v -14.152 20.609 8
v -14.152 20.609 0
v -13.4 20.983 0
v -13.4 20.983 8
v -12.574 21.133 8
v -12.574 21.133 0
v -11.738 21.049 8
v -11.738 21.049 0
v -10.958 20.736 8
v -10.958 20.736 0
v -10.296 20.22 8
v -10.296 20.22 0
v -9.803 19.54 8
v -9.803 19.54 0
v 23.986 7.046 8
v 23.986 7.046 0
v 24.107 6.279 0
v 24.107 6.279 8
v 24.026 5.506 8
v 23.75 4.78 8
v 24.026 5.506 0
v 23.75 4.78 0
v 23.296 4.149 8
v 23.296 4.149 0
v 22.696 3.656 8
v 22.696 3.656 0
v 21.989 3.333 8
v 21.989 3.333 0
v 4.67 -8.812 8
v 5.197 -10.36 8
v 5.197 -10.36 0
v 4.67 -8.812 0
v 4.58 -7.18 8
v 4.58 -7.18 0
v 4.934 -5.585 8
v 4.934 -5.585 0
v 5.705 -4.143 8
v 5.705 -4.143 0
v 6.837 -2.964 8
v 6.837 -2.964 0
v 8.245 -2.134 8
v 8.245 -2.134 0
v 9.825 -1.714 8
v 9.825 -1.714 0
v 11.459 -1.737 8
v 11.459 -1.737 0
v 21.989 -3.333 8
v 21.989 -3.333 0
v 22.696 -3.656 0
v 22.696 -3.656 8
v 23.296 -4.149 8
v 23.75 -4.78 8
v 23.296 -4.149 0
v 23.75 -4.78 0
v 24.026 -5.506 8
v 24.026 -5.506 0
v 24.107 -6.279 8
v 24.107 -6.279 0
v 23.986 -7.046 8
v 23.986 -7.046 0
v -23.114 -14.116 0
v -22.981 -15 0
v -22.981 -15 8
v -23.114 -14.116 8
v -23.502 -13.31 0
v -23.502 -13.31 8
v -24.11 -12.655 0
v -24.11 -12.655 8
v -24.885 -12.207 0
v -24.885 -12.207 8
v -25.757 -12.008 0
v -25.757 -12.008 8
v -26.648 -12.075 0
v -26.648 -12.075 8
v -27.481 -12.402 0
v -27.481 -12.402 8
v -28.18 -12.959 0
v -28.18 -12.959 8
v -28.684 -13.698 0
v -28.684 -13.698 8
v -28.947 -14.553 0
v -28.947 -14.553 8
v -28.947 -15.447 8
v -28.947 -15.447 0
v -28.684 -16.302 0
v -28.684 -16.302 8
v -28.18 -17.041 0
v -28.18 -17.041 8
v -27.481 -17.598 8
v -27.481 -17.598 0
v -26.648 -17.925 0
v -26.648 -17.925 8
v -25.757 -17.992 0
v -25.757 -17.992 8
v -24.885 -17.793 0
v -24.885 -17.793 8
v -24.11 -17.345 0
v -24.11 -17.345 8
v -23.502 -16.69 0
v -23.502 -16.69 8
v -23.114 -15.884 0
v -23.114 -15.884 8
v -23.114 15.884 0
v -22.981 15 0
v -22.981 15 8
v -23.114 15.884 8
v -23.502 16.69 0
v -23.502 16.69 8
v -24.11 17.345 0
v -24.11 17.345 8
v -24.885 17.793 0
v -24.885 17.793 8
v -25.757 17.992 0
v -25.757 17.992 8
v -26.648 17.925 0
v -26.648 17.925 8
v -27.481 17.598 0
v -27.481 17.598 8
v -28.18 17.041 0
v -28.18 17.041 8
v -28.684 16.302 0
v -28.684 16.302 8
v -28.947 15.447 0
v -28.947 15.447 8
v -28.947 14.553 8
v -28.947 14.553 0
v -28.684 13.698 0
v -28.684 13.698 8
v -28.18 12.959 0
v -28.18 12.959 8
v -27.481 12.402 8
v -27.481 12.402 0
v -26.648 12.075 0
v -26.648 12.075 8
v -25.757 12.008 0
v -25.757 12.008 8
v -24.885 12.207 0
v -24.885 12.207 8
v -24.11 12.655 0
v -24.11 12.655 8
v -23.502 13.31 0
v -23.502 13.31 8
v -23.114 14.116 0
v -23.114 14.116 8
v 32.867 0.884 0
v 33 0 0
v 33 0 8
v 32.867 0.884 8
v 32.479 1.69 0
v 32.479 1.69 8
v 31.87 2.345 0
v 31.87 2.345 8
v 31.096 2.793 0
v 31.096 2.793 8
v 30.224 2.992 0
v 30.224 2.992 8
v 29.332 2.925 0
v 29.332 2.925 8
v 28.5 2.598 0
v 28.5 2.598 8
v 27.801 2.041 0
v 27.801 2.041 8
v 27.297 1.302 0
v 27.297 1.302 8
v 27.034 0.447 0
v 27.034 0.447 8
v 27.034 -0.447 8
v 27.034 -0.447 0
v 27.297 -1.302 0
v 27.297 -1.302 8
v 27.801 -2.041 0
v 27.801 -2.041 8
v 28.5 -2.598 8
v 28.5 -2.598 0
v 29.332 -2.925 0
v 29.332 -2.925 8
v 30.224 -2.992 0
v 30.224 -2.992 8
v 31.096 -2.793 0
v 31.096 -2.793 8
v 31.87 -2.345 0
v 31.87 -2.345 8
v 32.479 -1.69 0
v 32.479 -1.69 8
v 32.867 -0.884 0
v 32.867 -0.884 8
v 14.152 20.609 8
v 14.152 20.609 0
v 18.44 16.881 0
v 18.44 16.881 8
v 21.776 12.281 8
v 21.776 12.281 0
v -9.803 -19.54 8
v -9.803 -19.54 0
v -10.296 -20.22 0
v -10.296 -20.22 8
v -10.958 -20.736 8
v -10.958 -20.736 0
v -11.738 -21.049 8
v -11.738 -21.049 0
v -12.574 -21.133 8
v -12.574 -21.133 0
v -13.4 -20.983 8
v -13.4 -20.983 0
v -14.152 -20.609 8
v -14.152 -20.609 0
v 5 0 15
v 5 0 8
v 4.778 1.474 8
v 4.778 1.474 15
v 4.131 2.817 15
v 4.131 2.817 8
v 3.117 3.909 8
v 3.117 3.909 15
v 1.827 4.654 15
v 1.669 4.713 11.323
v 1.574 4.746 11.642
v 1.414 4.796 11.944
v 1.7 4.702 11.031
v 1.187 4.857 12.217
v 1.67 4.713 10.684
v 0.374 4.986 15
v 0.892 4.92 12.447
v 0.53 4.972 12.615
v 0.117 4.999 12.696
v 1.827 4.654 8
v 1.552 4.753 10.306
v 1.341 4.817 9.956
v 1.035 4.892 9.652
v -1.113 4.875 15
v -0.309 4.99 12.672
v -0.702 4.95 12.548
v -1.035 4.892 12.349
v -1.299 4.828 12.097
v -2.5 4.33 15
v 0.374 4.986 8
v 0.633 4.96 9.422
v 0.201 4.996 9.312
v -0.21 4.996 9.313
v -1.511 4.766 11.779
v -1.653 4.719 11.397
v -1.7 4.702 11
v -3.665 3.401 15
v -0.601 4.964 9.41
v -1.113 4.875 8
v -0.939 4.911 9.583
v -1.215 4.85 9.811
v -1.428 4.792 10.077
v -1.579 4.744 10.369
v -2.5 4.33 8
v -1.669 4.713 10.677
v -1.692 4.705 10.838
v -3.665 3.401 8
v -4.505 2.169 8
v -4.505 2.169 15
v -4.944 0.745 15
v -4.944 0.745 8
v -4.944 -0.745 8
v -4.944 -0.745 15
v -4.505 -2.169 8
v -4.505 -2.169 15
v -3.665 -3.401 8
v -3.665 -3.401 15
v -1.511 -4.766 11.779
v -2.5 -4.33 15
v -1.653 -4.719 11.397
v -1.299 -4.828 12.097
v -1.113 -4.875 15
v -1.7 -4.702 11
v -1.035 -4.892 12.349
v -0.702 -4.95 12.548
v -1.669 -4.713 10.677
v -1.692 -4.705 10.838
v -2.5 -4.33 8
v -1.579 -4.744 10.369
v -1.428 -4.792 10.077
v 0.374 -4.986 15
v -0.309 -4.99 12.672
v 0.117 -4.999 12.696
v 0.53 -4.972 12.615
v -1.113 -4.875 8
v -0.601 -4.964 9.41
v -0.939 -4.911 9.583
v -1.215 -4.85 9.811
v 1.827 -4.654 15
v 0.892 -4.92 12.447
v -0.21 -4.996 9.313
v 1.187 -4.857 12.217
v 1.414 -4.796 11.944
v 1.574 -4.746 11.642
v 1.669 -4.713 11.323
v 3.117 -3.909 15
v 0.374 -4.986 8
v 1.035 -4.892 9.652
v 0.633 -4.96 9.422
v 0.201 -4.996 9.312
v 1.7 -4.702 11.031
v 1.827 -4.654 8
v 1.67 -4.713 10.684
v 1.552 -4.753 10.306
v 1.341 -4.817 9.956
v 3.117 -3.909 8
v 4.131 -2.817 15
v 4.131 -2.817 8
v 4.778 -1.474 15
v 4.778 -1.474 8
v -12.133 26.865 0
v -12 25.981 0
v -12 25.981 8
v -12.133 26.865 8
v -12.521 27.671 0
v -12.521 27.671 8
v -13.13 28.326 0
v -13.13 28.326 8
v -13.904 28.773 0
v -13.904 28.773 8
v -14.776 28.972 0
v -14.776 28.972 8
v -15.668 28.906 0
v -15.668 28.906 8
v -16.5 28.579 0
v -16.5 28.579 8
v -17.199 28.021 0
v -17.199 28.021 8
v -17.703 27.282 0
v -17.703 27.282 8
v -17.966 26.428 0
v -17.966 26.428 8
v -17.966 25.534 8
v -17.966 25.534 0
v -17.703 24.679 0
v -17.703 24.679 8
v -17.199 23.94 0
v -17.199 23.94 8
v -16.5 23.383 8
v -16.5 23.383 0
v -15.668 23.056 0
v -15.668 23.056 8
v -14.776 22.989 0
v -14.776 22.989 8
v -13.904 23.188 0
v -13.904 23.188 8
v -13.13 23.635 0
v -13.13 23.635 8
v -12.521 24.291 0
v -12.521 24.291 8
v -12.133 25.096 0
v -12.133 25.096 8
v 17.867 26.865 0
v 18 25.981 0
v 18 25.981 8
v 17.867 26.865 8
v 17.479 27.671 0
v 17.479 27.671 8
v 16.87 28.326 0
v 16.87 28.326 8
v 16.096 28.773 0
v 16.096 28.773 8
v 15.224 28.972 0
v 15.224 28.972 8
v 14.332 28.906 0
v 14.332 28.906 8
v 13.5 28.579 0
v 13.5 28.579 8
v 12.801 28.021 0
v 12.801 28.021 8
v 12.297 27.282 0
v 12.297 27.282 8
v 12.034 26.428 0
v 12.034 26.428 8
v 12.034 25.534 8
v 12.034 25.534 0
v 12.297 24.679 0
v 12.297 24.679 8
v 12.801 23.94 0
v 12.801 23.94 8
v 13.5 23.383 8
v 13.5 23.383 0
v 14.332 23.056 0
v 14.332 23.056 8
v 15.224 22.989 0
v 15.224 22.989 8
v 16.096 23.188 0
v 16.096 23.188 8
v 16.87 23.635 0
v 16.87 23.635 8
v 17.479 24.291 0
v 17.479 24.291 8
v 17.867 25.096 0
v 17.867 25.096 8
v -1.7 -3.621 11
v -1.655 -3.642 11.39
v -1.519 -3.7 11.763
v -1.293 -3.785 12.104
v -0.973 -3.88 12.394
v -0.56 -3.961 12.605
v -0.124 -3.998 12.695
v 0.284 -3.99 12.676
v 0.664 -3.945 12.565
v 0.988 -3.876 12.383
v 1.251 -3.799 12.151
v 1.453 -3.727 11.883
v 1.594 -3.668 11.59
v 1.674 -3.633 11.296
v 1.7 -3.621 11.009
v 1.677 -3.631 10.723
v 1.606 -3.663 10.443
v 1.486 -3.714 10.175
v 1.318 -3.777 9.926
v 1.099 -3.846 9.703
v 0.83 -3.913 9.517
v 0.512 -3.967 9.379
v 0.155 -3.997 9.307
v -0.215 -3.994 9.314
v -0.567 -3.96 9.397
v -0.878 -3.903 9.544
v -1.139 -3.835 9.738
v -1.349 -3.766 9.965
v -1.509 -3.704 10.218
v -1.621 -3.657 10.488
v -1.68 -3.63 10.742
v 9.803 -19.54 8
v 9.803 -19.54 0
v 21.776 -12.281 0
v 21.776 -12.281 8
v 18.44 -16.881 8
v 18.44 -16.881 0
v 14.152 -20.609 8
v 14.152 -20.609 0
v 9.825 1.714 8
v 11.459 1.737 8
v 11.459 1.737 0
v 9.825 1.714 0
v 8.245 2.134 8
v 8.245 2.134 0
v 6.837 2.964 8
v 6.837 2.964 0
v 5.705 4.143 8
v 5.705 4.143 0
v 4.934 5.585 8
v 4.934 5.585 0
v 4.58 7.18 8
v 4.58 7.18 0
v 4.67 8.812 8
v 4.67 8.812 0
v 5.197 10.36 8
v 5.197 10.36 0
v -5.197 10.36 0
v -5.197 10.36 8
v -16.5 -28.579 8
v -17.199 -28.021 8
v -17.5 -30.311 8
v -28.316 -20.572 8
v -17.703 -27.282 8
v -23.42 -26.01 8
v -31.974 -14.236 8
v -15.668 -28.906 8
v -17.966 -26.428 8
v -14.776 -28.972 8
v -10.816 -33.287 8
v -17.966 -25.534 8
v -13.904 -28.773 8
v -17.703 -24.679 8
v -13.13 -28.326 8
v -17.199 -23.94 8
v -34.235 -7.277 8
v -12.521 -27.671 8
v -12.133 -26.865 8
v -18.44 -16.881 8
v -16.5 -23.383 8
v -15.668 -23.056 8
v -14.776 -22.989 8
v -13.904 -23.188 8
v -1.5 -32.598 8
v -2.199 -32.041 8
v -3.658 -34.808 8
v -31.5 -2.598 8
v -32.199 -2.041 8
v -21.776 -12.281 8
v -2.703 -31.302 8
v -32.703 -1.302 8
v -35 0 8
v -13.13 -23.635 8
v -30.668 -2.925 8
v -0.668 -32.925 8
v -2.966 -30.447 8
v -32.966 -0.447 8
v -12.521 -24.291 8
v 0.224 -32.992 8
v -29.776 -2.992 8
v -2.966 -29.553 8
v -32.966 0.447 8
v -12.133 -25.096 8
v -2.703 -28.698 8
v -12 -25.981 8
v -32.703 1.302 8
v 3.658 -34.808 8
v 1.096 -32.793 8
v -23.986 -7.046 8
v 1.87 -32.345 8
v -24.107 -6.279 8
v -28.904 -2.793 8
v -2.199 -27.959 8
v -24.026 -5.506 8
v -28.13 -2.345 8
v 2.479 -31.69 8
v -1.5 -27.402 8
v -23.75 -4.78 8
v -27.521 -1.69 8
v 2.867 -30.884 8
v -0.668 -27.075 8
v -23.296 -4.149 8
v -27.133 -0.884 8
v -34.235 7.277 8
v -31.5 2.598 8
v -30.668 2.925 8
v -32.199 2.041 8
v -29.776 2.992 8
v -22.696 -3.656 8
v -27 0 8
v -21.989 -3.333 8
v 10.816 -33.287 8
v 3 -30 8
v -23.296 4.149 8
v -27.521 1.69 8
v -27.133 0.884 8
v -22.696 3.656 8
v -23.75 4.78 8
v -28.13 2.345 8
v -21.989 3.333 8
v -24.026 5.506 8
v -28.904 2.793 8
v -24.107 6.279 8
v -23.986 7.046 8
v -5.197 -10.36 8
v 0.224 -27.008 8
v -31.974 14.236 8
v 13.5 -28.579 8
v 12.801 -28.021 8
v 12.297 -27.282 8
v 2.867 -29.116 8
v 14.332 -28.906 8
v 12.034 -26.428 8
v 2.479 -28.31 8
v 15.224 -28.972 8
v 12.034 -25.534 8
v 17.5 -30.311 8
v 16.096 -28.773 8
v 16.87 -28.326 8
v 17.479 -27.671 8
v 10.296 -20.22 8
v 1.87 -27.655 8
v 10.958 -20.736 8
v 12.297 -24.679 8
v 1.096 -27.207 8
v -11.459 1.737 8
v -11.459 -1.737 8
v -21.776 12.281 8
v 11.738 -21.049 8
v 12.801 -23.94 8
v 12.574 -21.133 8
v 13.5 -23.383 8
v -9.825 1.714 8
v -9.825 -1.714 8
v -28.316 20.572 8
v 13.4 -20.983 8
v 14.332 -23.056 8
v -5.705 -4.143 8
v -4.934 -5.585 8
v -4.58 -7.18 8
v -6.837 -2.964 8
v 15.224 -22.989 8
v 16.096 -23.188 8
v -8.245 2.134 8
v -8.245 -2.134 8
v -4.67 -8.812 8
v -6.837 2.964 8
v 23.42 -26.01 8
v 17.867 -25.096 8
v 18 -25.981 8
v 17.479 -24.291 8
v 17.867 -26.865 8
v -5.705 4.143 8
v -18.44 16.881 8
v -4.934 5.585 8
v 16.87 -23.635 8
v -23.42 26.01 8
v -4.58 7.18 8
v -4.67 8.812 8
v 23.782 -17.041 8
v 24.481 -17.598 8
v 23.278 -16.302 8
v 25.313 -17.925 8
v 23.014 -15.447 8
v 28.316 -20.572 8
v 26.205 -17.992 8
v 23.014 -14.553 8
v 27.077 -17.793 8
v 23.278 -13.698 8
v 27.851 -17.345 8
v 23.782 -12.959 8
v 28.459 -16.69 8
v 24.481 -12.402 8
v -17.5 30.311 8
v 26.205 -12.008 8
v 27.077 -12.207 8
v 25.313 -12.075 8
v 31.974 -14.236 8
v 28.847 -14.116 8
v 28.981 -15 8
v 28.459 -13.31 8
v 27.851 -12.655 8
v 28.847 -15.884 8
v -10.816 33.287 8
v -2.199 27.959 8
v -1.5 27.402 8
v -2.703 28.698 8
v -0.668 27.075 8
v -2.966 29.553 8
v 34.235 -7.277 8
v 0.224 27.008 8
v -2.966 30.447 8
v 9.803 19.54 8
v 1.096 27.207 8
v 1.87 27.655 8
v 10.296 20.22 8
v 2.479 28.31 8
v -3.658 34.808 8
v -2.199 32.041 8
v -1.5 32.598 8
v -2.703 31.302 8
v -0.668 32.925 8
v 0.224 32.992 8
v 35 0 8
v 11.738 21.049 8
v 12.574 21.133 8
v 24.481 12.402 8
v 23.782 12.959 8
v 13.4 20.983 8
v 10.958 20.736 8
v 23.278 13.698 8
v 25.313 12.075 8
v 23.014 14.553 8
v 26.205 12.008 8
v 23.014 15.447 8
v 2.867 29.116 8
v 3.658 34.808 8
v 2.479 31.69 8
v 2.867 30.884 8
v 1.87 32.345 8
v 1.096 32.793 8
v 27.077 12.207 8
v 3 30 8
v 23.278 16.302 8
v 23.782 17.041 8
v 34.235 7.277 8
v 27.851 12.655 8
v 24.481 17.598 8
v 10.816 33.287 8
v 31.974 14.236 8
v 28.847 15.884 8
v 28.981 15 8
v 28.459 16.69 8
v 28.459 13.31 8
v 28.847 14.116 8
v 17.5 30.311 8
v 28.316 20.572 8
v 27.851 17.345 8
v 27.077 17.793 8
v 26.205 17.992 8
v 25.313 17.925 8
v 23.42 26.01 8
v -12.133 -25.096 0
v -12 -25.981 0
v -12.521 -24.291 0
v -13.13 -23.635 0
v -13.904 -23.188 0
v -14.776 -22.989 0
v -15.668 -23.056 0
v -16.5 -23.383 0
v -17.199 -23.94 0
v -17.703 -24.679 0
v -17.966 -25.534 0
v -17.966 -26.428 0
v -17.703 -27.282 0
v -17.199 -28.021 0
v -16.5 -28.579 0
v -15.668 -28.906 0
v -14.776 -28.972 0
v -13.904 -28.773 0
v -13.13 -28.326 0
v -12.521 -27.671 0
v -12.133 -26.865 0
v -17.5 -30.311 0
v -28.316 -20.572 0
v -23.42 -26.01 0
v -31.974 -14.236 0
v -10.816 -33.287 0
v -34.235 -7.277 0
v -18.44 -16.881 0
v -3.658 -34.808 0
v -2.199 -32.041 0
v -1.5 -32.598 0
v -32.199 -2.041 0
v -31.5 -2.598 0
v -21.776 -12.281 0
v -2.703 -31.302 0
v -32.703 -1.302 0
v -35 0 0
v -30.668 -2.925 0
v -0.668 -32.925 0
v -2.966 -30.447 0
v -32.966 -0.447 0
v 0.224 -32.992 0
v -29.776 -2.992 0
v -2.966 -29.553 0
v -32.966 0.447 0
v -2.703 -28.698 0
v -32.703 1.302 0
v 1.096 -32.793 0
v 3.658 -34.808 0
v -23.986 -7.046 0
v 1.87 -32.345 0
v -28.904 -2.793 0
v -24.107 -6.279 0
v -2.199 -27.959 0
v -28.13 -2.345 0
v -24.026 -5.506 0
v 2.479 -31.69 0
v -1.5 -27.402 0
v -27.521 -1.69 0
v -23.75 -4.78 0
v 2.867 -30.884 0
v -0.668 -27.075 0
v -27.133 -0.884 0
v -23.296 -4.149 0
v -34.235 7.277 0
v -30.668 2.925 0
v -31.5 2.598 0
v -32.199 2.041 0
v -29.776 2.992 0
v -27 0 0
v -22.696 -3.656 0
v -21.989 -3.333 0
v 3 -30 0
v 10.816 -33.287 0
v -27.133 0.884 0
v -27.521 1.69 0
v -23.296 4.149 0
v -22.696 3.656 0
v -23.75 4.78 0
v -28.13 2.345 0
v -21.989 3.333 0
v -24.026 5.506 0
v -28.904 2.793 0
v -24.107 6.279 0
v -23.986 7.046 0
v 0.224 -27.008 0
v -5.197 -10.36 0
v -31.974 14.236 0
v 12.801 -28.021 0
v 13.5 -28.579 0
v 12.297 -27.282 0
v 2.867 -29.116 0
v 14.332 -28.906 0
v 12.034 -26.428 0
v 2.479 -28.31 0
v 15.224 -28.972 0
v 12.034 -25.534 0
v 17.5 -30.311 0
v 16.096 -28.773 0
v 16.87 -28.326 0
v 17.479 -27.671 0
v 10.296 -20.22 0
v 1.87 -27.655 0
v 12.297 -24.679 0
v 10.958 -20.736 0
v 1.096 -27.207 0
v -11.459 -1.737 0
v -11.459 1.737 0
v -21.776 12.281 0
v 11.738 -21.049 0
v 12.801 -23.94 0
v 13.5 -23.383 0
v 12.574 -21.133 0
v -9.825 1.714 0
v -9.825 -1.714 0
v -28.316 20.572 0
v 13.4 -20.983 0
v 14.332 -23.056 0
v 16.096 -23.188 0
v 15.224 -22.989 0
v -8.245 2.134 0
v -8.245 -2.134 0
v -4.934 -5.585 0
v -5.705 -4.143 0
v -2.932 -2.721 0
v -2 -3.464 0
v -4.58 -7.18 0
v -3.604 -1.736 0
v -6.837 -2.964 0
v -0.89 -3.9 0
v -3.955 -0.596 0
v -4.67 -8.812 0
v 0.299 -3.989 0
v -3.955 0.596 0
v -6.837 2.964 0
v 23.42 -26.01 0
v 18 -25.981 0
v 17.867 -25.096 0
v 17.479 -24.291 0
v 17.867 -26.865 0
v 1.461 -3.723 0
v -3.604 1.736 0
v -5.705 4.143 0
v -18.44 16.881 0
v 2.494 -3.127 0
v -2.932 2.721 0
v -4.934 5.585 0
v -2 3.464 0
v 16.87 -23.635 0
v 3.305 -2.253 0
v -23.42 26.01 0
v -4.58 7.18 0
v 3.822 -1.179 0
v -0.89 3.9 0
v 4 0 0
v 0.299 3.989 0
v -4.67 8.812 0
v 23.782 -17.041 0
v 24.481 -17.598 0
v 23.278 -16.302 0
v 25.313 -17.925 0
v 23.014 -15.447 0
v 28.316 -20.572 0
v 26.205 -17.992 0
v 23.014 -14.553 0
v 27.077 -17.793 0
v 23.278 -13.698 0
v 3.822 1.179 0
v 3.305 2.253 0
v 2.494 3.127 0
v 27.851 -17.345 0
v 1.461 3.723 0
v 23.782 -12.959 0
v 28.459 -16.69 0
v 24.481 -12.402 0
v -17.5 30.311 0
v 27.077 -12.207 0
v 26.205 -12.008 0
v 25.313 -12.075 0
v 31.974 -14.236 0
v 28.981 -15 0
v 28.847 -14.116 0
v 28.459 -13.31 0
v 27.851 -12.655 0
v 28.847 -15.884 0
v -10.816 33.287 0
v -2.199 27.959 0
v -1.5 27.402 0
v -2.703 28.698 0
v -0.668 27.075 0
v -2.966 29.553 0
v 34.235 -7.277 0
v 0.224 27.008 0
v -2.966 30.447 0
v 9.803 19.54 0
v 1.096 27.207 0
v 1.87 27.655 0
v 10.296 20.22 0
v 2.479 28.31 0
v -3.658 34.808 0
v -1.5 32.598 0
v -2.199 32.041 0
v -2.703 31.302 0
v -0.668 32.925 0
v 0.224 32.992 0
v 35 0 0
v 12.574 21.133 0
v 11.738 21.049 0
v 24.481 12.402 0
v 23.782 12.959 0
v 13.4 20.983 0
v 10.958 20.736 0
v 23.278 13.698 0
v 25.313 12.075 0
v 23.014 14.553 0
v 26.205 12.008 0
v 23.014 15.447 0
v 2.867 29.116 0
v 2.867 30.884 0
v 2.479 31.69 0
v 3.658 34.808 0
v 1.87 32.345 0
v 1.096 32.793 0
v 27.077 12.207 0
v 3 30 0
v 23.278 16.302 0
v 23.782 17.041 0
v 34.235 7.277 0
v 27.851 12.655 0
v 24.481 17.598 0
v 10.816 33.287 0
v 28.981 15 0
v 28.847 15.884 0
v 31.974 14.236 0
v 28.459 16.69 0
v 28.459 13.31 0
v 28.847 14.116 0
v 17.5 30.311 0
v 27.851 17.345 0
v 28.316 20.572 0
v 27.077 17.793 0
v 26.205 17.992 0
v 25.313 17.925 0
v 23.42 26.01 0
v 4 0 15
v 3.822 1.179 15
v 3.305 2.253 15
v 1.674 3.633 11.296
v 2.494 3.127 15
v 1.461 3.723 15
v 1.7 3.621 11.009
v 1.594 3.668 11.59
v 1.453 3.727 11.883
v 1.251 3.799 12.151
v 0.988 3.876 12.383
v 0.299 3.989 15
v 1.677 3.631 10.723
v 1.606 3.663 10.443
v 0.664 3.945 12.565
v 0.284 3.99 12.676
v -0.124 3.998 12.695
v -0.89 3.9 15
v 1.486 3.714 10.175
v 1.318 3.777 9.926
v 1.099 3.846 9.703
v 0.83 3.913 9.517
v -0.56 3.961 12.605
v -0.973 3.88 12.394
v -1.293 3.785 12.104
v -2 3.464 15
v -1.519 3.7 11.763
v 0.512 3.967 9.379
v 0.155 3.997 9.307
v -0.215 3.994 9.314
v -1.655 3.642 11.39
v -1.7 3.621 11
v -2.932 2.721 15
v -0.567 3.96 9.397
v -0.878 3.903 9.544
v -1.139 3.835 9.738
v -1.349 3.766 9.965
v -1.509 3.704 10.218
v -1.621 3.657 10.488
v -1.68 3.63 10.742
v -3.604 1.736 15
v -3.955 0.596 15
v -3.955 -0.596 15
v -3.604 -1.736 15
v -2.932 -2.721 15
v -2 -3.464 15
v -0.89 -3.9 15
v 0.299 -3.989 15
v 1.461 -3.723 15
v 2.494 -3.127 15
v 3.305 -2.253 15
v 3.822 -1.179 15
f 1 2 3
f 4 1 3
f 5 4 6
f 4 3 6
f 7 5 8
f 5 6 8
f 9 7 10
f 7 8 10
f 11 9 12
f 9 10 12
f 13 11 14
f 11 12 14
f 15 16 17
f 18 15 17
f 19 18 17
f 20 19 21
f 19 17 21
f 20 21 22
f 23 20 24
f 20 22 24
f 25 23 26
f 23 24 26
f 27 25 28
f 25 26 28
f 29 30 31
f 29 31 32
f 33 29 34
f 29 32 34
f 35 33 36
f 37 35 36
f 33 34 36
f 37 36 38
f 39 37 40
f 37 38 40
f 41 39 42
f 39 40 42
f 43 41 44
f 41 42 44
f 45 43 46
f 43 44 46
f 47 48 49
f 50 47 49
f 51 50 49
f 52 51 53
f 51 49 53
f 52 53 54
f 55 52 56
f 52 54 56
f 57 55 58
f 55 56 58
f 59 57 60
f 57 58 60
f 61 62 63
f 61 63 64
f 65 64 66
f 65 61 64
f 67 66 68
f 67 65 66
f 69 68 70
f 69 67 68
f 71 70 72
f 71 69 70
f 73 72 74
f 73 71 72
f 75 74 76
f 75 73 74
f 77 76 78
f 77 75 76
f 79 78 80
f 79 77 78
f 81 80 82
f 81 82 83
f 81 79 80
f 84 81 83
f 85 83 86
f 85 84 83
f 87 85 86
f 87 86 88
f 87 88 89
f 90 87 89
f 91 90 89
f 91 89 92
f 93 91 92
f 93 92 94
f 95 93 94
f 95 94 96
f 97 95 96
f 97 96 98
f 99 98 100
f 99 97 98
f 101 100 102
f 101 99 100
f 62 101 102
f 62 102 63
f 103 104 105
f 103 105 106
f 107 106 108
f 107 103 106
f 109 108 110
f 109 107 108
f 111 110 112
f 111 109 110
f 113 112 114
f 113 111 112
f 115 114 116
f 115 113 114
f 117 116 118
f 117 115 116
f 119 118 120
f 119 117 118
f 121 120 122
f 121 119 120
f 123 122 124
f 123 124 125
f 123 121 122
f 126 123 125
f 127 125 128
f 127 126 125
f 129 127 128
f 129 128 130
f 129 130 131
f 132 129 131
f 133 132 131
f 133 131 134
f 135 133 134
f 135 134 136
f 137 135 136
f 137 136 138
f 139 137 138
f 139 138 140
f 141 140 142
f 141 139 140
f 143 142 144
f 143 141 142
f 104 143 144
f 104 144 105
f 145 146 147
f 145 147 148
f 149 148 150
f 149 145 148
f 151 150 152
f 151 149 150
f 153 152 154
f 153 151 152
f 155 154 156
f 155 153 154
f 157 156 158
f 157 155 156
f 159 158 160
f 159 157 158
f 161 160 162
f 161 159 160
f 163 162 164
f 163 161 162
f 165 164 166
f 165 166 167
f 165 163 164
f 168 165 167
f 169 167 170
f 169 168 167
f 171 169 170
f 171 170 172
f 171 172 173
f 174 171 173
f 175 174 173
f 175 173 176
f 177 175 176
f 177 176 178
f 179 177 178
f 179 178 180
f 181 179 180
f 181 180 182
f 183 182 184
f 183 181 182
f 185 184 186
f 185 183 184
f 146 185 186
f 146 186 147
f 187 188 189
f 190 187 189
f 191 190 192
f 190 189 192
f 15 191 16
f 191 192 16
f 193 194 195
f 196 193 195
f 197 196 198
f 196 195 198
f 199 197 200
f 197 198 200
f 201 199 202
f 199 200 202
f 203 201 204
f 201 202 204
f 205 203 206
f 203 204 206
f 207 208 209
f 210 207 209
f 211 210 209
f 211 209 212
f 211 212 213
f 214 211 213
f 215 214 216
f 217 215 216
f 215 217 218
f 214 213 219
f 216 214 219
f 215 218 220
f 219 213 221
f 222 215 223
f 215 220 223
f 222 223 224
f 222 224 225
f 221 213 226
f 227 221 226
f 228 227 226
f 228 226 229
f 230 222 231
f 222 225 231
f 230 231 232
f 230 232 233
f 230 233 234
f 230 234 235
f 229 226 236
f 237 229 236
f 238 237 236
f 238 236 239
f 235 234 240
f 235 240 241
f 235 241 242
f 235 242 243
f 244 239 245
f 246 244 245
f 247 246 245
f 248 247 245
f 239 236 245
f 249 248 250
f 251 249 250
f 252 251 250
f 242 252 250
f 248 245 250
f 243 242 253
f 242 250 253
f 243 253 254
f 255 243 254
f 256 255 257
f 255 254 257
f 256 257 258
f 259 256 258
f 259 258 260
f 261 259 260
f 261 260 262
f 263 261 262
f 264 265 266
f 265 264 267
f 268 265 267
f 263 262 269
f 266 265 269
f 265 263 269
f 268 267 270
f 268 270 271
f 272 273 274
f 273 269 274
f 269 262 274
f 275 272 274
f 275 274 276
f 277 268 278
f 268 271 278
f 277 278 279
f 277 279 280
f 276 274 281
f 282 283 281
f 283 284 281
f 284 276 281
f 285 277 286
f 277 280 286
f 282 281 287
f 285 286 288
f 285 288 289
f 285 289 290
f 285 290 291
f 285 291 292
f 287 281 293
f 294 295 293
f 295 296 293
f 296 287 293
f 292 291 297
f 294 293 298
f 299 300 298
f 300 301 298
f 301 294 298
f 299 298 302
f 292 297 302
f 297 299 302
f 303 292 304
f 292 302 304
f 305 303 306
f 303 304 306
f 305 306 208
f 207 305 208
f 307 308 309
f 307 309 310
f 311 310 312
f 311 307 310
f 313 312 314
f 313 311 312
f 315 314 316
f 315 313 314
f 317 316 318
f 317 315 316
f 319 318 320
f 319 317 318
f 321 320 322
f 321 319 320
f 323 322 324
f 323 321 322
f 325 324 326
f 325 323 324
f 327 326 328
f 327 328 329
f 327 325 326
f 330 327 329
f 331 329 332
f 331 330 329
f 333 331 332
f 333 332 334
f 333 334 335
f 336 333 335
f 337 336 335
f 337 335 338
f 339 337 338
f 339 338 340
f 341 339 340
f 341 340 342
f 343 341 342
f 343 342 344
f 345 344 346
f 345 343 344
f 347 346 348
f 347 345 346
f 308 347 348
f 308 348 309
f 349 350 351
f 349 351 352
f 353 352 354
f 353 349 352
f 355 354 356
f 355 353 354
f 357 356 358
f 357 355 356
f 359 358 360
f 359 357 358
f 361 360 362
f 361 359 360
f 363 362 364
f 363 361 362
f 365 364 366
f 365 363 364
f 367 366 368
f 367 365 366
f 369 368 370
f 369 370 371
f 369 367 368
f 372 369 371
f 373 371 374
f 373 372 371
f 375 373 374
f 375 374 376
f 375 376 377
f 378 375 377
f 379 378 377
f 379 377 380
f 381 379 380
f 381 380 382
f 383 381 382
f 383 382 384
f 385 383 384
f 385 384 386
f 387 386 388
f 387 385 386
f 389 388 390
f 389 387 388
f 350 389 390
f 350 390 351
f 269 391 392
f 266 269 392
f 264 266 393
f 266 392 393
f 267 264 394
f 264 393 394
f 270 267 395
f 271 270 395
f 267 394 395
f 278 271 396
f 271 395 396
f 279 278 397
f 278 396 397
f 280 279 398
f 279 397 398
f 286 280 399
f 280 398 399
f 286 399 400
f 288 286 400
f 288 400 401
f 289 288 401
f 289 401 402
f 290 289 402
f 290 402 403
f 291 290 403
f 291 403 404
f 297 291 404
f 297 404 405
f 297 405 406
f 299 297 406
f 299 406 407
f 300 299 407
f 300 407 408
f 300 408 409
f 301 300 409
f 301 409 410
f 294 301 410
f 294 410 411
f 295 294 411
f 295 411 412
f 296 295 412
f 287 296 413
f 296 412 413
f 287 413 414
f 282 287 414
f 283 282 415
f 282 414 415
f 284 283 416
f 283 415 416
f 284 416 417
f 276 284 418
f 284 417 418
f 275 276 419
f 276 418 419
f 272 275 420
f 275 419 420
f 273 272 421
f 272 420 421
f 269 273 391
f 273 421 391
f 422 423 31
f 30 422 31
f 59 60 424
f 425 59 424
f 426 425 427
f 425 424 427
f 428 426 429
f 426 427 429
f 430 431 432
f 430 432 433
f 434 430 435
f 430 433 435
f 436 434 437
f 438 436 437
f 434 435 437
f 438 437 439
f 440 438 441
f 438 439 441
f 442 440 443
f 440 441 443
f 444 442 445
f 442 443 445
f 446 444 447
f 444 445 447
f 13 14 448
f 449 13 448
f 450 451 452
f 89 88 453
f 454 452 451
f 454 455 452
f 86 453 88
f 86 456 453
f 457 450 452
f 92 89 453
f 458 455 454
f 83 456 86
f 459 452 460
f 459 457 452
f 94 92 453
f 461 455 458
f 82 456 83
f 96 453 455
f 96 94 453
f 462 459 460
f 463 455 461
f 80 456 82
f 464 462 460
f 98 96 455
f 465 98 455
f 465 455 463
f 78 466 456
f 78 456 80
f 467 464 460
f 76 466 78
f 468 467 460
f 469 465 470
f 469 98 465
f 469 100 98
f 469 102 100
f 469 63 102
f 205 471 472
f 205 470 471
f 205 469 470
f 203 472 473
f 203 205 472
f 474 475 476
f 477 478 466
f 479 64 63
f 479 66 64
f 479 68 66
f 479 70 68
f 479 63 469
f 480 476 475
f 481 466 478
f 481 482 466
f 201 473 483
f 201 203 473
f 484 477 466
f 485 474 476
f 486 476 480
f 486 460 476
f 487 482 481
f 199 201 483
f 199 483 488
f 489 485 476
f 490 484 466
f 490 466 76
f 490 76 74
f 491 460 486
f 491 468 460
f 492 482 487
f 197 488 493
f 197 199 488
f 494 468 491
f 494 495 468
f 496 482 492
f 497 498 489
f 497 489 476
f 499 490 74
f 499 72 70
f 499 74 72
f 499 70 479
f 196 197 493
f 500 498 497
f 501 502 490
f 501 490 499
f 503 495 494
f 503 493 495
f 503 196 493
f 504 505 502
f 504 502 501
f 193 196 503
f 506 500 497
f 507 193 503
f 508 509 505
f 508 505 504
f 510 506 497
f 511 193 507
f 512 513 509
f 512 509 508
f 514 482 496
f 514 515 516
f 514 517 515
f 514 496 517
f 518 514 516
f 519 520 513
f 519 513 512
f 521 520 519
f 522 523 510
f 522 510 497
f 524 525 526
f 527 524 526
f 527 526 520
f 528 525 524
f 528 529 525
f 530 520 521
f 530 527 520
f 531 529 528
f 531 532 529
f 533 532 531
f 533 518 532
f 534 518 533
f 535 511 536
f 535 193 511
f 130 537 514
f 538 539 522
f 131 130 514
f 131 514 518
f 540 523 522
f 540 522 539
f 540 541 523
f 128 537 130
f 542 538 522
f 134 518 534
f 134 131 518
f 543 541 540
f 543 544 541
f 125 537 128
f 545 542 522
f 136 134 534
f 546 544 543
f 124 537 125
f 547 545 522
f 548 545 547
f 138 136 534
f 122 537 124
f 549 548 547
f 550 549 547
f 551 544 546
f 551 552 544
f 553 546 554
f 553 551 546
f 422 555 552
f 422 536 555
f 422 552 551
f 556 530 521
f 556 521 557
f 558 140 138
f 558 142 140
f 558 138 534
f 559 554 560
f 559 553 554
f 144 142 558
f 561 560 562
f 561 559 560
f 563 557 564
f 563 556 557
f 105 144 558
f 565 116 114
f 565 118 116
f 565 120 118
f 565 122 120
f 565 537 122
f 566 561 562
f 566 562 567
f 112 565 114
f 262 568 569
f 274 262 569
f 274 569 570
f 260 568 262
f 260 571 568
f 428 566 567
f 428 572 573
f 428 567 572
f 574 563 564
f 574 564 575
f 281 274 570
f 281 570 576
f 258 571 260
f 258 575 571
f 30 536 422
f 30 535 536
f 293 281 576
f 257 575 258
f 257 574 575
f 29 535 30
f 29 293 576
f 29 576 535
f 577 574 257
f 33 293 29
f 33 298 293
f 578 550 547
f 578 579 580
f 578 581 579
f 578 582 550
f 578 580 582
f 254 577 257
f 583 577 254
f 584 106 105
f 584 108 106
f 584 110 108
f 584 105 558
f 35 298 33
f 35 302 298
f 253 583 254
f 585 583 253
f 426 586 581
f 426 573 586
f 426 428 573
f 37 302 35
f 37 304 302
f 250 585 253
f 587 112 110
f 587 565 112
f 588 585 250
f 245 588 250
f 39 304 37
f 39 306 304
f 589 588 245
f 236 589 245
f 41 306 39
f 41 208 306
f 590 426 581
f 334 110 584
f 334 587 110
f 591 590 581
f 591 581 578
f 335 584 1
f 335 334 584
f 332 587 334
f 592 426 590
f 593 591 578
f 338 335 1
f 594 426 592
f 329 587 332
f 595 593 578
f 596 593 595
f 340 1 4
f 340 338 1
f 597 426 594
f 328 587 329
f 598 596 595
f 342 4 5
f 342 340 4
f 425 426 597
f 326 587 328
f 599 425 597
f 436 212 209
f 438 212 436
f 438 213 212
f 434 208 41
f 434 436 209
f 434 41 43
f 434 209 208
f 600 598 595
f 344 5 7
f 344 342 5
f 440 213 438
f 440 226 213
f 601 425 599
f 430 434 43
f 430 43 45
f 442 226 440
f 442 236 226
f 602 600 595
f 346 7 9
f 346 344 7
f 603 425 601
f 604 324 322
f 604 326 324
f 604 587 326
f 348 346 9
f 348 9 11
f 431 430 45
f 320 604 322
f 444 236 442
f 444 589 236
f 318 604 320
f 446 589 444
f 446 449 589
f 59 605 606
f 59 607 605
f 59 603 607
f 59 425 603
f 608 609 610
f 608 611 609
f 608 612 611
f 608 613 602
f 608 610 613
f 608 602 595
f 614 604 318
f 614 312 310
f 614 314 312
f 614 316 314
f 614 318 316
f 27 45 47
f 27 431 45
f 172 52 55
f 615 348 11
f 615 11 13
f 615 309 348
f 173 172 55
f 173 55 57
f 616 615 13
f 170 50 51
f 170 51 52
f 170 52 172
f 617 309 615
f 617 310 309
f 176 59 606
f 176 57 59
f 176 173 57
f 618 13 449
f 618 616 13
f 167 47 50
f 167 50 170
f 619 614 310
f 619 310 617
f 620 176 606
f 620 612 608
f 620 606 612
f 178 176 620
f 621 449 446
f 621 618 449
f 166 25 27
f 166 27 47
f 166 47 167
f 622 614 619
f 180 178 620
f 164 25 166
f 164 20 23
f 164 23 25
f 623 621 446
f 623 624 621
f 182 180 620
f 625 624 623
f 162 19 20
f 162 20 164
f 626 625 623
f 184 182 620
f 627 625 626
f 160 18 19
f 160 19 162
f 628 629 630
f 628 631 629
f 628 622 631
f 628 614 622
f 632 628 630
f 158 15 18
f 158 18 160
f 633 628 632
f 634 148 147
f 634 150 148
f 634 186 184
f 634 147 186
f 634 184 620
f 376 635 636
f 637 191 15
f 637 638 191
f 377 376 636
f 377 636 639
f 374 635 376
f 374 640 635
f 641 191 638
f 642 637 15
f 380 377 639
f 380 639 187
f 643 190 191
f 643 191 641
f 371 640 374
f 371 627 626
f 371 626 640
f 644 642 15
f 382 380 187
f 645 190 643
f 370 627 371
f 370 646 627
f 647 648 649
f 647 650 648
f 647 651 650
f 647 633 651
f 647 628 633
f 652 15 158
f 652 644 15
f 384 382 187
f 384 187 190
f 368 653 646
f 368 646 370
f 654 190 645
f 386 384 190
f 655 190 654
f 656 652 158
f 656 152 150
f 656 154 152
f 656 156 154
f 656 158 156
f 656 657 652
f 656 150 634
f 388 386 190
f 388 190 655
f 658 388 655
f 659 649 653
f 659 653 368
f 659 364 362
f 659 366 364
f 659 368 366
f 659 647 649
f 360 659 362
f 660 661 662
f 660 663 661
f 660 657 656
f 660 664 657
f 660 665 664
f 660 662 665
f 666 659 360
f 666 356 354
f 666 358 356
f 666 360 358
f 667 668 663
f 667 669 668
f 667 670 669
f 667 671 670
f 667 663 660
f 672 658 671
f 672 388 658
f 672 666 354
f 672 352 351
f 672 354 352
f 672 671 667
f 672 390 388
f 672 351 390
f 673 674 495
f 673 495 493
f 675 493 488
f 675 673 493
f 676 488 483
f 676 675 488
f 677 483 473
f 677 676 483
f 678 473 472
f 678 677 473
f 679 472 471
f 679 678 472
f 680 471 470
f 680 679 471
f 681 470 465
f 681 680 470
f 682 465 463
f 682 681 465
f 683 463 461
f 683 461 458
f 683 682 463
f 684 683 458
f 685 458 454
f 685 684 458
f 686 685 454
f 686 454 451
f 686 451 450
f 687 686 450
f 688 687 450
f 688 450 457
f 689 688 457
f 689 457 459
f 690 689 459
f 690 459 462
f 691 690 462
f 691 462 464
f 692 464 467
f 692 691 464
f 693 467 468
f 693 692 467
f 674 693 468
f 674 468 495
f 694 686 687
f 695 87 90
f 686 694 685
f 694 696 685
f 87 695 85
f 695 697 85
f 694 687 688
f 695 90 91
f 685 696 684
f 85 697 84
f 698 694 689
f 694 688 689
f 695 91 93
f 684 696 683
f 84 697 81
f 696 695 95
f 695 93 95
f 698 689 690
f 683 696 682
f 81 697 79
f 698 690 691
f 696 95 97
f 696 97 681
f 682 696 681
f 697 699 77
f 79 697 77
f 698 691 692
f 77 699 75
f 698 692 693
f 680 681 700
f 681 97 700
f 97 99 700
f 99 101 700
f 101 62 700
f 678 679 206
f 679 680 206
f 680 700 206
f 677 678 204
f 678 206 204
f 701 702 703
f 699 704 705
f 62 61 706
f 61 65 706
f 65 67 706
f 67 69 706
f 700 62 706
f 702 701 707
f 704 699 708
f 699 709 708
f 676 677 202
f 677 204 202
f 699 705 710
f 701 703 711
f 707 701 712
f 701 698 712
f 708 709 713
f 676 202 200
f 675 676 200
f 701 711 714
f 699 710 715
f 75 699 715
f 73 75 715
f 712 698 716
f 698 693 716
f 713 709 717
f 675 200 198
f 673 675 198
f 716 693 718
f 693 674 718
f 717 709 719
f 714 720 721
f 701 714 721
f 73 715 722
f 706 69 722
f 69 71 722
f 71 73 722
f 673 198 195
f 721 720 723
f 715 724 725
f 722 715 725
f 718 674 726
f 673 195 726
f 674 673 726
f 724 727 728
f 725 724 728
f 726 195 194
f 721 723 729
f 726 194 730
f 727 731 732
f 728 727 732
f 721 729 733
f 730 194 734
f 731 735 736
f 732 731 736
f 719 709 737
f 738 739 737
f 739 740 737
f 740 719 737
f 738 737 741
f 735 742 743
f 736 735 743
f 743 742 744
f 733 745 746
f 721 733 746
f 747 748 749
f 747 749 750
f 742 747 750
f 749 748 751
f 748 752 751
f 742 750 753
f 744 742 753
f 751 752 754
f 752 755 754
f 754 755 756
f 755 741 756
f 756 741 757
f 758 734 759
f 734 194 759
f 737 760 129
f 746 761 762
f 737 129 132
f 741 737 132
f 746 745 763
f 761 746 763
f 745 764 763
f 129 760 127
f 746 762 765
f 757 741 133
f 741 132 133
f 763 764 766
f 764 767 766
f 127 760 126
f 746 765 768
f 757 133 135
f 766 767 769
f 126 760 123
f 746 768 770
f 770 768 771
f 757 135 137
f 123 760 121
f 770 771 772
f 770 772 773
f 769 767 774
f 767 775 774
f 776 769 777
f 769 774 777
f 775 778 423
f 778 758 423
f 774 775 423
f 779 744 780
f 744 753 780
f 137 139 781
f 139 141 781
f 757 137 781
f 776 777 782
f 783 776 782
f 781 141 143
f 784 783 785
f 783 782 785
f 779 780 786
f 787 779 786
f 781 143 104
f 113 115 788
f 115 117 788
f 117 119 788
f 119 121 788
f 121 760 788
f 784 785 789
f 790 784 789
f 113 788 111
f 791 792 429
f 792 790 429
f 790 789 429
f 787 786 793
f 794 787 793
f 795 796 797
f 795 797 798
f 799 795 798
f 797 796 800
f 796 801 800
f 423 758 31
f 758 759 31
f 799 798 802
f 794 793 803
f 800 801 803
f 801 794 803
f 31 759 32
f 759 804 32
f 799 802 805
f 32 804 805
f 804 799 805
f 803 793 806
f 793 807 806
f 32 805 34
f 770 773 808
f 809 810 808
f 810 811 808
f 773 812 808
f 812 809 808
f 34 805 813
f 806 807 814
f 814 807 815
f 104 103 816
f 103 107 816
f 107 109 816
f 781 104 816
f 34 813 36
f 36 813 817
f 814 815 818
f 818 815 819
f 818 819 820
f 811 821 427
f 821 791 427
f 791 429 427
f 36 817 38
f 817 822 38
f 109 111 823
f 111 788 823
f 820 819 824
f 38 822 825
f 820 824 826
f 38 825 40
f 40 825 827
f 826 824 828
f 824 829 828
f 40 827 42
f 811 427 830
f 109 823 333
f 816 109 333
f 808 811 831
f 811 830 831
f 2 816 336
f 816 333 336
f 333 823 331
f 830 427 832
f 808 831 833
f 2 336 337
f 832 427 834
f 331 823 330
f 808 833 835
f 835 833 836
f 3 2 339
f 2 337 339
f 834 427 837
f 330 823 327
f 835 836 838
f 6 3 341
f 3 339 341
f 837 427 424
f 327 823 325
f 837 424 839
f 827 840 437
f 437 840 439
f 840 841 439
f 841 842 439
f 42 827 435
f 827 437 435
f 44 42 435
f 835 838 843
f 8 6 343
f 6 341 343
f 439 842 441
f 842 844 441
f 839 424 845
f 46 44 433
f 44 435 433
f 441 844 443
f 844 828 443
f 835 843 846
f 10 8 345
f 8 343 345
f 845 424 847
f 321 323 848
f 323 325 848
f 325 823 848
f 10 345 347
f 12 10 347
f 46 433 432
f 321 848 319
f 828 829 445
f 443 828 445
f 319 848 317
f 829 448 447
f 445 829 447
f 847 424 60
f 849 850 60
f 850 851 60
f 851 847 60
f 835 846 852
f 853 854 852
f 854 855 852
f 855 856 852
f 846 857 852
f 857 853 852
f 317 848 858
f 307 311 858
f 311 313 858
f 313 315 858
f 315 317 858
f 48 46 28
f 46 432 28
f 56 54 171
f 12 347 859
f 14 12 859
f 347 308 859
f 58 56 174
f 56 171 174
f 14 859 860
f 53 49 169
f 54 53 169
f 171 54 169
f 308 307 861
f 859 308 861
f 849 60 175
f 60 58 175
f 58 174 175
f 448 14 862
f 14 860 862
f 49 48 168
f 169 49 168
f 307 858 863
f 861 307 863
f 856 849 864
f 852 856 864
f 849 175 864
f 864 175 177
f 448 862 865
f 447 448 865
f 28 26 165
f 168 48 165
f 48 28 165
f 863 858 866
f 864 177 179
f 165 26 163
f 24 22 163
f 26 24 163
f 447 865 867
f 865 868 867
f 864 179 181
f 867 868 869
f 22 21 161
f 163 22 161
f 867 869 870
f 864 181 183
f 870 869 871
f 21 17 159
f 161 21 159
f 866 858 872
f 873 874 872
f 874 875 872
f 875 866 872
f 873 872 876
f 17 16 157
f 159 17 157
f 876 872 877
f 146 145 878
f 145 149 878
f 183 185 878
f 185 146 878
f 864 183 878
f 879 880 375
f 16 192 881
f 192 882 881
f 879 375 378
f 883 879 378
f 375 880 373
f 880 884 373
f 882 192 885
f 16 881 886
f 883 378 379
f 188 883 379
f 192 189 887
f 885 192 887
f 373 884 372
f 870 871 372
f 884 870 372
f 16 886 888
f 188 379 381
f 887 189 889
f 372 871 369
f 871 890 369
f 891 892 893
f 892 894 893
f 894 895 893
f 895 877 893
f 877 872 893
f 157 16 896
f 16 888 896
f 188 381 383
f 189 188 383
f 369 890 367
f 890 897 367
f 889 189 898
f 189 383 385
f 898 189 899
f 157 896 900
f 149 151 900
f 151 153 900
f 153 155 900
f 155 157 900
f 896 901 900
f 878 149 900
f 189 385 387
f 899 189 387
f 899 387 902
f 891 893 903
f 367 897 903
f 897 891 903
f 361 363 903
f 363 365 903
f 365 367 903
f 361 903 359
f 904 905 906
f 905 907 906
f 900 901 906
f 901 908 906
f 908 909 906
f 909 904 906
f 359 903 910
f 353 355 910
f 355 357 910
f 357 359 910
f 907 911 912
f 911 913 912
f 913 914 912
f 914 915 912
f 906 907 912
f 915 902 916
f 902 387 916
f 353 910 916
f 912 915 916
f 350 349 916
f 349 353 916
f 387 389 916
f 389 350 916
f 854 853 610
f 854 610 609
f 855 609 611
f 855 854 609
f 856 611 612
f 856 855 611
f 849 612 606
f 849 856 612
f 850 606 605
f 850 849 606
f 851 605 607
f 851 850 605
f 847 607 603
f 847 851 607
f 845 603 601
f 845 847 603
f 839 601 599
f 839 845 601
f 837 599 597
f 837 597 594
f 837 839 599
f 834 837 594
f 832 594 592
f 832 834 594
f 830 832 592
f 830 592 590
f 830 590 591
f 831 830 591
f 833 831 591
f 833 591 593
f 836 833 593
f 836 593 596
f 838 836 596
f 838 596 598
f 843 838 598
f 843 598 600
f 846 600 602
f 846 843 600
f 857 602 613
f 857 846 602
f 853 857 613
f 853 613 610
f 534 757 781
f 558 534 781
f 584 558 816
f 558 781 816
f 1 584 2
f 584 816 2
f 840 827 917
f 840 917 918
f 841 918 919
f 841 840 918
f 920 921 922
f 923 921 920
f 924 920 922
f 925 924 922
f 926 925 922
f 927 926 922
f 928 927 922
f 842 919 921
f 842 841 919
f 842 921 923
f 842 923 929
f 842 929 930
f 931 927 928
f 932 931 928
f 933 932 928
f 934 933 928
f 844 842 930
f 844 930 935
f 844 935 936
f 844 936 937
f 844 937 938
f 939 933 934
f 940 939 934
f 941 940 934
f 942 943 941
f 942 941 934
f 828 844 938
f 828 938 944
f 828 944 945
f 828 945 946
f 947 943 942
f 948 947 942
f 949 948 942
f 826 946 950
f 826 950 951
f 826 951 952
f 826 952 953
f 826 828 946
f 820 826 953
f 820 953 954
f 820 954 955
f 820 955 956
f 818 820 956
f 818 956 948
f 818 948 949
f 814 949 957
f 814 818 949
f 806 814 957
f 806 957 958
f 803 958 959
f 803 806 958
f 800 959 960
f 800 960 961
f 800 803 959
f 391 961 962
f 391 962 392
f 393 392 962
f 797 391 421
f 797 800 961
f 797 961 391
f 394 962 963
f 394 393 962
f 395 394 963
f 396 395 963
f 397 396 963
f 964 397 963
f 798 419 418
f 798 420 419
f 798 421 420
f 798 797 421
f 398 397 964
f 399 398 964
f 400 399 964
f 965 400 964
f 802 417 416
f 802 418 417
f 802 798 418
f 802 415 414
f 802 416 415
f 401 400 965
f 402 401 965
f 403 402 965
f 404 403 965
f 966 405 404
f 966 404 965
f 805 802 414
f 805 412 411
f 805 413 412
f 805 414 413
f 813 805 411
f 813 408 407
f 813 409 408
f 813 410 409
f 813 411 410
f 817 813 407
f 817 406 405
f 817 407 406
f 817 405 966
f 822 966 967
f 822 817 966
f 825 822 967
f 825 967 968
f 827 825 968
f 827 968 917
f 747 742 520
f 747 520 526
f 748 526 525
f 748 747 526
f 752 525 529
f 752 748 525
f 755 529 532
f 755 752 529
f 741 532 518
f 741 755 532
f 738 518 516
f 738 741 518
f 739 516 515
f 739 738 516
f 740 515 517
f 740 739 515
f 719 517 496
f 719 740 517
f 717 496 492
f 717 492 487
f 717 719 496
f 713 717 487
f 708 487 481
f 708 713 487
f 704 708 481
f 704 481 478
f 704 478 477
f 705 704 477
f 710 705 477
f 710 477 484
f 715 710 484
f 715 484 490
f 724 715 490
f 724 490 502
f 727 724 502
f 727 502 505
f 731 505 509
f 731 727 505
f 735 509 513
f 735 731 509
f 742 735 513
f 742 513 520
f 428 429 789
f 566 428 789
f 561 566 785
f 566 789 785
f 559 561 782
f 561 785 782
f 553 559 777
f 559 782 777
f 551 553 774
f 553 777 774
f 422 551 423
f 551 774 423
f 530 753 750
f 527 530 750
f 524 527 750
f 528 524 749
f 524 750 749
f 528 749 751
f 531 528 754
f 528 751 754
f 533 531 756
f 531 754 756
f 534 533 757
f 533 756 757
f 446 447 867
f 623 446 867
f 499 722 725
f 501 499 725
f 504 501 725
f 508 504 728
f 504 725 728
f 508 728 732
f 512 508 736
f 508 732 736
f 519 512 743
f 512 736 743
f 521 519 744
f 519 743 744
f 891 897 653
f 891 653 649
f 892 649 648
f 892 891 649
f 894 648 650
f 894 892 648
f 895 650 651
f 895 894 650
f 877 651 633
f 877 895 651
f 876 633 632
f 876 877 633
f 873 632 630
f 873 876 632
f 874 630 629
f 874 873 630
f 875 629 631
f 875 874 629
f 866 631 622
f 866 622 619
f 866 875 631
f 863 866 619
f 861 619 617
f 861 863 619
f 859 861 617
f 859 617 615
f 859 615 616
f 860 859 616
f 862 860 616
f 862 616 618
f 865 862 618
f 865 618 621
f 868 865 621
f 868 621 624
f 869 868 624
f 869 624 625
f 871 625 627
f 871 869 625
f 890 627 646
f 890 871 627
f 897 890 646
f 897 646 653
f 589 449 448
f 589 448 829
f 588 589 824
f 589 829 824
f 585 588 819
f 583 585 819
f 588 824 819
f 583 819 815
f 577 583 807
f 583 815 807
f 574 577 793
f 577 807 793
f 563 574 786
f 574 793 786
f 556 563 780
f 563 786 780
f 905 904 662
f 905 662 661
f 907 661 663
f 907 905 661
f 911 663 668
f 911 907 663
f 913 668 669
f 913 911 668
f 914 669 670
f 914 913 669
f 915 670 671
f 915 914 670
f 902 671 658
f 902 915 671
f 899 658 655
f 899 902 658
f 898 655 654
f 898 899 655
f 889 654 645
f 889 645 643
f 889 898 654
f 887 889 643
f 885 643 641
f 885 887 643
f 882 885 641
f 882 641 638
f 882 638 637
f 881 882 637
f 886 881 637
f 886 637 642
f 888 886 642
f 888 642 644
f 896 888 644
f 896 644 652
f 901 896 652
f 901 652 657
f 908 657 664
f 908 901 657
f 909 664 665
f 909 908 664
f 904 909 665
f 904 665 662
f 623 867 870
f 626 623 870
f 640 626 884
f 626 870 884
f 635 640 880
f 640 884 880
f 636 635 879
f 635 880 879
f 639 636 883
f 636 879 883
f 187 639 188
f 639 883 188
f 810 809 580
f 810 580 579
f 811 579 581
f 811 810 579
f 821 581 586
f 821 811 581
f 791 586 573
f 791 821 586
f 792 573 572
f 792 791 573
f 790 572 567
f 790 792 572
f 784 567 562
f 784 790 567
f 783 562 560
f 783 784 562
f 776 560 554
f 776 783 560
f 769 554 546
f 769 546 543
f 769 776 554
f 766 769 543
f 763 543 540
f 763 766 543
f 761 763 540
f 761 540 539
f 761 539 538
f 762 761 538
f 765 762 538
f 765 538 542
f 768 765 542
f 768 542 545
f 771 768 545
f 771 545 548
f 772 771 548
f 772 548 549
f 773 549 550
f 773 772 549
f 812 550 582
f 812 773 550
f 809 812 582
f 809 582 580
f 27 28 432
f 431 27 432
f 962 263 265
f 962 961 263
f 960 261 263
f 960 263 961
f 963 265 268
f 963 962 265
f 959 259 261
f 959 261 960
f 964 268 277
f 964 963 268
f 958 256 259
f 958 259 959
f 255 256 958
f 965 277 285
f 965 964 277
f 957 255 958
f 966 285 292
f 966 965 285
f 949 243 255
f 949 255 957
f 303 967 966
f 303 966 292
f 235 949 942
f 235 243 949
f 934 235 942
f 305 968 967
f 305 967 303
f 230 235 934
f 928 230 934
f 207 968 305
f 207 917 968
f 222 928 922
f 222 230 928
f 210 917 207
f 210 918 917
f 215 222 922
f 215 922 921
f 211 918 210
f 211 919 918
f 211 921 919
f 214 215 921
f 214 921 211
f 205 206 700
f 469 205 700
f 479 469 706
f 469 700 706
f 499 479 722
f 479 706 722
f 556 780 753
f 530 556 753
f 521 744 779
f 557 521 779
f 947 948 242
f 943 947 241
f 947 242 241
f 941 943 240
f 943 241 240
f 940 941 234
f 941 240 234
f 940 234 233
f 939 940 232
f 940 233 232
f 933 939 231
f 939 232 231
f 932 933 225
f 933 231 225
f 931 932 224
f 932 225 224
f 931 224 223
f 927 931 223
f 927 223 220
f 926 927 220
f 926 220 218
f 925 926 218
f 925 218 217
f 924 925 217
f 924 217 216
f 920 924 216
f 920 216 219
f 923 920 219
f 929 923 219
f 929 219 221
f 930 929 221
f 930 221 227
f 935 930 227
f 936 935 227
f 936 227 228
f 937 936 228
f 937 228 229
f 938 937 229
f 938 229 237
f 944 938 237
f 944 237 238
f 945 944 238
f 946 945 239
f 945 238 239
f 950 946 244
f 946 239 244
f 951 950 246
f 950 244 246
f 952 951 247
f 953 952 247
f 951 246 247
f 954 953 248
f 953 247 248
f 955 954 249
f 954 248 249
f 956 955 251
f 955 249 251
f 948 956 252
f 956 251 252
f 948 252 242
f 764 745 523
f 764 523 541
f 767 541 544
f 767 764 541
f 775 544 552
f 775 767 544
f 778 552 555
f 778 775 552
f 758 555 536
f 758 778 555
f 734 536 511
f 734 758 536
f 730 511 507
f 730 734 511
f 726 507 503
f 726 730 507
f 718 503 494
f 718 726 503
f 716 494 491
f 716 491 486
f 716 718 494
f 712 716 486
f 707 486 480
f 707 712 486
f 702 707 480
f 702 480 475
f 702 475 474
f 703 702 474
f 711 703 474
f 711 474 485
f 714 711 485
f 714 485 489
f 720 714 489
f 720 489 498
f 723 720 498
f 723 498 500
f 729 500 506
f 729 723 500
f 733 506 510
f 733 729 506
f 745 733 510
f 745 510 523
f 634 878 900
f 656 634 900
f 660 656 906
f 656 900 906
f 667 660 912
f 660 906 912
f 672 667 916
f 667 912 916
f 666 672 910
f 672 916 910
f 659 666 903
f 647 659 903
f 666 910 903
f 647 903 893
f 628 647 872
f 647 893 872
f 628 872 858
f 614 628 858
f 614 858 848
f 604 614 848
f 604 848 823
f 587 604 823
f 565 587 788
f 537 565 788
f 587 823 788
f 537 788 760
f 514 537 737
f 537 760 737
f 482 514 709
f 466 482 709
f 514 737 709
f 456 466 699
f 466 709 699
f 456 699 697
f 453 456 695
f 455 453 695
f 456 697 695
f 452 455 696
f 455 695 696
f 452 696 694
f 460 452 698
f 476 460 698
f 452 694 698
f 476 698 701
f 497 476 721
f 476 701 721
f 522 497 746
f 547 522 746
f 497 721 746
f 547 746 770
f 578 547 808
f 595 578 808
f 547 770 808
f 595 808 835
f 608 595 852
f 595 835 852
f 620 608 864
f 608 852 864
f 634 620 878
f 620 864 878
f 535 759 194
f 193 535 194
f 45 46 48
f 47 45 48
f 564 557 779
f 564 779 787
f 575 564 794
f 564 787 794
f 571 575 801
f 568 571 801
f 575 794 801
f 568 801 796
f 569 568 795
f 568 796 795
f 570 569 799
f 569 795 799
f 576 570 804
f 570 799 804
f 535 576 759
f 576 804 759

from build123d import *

# Parameters (mm, degrees)
F0_R     = 35
F0_R_2   = 3
F0_R_3   = 4
F1_DEPTH = 8
F2_R     = 5
F2_R_2   = 4
F3_DEPTH = 7
F6_D     = 3.4


with BuildPart() as f1:
    # F0 (on Top) → F1 (new body)
    with BuildSketch(Plane.XY):
        Circle(F0_R)
        with Locations((-15, -25.9807621135)):
            Circle(F0_R_2, mode=Mode.SUBTRACT)
        with Locations((-25.9807621135, -15)):
            Circle(F0_R_2, mode=Mode.SUBTRACT)
        with BuildLine():
            ThreePointArc((-14.1520683747, -20.6087107971), (-20.2390786896, -14.6758200382), (-23.9864227741, -7.0463836473))
            ThreePointArc((-23.9864227741, -7.0463836473), (-23.7500595541, -4.779622232), (-21.9889424597, -3.3330602854))
            Line((-21.9889424597, -3.3330602854), (-11.4594190982, -1.7370064413))
            ThreePointArc((-11.4594190982, -1.7370064413), (-5.7054148294, -4.143495838), (-5.1972611447, -10.3597275079))
            Line((-5.1972611447, -10.3597275079), (-9.8028524215, -19.5400764091))
            ThreePointArc((-9.8028524215, -19.5400764091), (-11.7379895363, -21.049011774), (-14.1520683747, -20.6087107971))
        make_face(mode=Mode.SUBTRACT)
        with Locations((0, -30)):
            Circle(F0_R_2, mode=Mode.SUBTRACT)
        with Locations((15, -25.9807621135)):
            Circle(F0_R_2, mode=Mode.SUBTRACT)
        with BuildLine():
            ThreePointArc((21.9889424597, -3.3330602854), (23.7500595541, -4.779622232), (23.9864227741, -7.0463836473))
            ThreePointArc((23.9864227741, -7.0463836473), (20.2390786896, -14.6758200382), (14.1520683747, -20.6087107971))
            ThreePointArc((14.1520683747, -20.6087107971), (11.7379895363, -21.049011774), (9.8028524215, -19.5400764091))
            Line((9.8028524215, -19.5400764091), (5.1972611447, -10.3597275079))
            ThreePointArc((5.1972611447, -10.3597275079), (5.7054148294, -4.143495838), (11.4594190982, -1.7370064413))
            Line((11.4594190982, -1.7370064413), (21.9889424597, -3.3330602854))
        make_face(mode=Mode.SUBTRACT)
        with Locations((25.9807621135, -15)):
            Circle(F0_R_2, mode=Mode.SUBTRACT)
        with Locations((-30, 0)):
            Circle(F0_R_2, mode=Mode.SUBTRACT)
        with Locations((-25.9807621135, 15)):
            Circle(F0_R_2, mode=Mode.SUBTRACT)
        with BuildLine():
            ThreePointArc((-23.9864227741, 7.0463836473), (-20.2390786896, 14.6758200382), (-14.1520683747, 20.6087107971))
            ThreePointArc((-14.1520683747, 20.6087107971), (-11.7379895363, 21.049011774), (-9.8028524215, 19.5400764091))
            Line((-9.8028524215, 19.5400764091), (-5.1972611447, 10.3597275079))
            ThreePointArc((-5.1972611447, 10.3597275079), (-5.7054148294, 4.143495838), (-11.4594190982, 1.7370064413))
            Line((-11.4594190982, 1.7370064413), (-21.9889424597, 3.3330602854))
            ThreePointArc((-21.9889424597, 3.3330602854), (-23.7500595541, 4.779622232), (-23.9864227741, 7.0463836473))
        make_face(mode=Mode.SUBTRACT)
        with Locations((-15, 25.9807621135)):
            Circle(F0_R_2, mode=Mode.SUBTRACT)
        Circle(F0_R_3, mode=Mode.SUBTRACT)
        with BuildLine():
            ThreePointArc((9.8028524215, 19.5400764091), (11.7379895363, 21.049011774), (14.1520683747, 20.6087107971))
            ThreePointArc((14.1520683747, 20.6087107971), (20.2390786896, 14.6758200382), (23.9864227741, 7.0463836473))
            ThreePointArc((23.9864227741, 7.0463836473), (23.7500595541, 4.779622232), (21.9889424597, 3.3330602854))
            Line((21.9889424597, 3.3330602854), (11.4594190982, 1.7370064413))
            ThreePointArc((11.4594190982, 1.7370064413), (5.7054148294, 4.143495838), (5.1972611447, 10.3597275079))
            Line((5.1972611447, 10.3597275079), (9.8028524215, 19.5400764091))
        make_face(mode=Mode.SUBTRACT)
        with Locations((30, 0)):
            Circle(F0_R_2, mode=Mode.SUBTRACT)
        with Locations((25.9807621135, 15)):
            Circle(F0_R_2, mode=Mode.SUBTRACT)
        with Locations((15, 25.9807621135)):
            Circle(F0_R_2, mode=Mode.SUBTRACT)
        with Locations((0, 30)):
            Circle(F0_R_2, mode=Mode.SUBTRACT)
    extrude(amount=F1_DEPTH)

    # F2 (on face) → F3 (join)
    with BuildSketch(Plane.XY.offset(8)):
        Circle(F2_R)
        Circle(F2_R_2, mode=Mode.SUBTRACT)
    extrude(amount=F3_DEPTH)

    # F6 (through all)
    with Locations(Plane.XZ.offset(5)):
        with Locations((0, 11)):
            Hole(F6_D / 2)


solid = f1.part
